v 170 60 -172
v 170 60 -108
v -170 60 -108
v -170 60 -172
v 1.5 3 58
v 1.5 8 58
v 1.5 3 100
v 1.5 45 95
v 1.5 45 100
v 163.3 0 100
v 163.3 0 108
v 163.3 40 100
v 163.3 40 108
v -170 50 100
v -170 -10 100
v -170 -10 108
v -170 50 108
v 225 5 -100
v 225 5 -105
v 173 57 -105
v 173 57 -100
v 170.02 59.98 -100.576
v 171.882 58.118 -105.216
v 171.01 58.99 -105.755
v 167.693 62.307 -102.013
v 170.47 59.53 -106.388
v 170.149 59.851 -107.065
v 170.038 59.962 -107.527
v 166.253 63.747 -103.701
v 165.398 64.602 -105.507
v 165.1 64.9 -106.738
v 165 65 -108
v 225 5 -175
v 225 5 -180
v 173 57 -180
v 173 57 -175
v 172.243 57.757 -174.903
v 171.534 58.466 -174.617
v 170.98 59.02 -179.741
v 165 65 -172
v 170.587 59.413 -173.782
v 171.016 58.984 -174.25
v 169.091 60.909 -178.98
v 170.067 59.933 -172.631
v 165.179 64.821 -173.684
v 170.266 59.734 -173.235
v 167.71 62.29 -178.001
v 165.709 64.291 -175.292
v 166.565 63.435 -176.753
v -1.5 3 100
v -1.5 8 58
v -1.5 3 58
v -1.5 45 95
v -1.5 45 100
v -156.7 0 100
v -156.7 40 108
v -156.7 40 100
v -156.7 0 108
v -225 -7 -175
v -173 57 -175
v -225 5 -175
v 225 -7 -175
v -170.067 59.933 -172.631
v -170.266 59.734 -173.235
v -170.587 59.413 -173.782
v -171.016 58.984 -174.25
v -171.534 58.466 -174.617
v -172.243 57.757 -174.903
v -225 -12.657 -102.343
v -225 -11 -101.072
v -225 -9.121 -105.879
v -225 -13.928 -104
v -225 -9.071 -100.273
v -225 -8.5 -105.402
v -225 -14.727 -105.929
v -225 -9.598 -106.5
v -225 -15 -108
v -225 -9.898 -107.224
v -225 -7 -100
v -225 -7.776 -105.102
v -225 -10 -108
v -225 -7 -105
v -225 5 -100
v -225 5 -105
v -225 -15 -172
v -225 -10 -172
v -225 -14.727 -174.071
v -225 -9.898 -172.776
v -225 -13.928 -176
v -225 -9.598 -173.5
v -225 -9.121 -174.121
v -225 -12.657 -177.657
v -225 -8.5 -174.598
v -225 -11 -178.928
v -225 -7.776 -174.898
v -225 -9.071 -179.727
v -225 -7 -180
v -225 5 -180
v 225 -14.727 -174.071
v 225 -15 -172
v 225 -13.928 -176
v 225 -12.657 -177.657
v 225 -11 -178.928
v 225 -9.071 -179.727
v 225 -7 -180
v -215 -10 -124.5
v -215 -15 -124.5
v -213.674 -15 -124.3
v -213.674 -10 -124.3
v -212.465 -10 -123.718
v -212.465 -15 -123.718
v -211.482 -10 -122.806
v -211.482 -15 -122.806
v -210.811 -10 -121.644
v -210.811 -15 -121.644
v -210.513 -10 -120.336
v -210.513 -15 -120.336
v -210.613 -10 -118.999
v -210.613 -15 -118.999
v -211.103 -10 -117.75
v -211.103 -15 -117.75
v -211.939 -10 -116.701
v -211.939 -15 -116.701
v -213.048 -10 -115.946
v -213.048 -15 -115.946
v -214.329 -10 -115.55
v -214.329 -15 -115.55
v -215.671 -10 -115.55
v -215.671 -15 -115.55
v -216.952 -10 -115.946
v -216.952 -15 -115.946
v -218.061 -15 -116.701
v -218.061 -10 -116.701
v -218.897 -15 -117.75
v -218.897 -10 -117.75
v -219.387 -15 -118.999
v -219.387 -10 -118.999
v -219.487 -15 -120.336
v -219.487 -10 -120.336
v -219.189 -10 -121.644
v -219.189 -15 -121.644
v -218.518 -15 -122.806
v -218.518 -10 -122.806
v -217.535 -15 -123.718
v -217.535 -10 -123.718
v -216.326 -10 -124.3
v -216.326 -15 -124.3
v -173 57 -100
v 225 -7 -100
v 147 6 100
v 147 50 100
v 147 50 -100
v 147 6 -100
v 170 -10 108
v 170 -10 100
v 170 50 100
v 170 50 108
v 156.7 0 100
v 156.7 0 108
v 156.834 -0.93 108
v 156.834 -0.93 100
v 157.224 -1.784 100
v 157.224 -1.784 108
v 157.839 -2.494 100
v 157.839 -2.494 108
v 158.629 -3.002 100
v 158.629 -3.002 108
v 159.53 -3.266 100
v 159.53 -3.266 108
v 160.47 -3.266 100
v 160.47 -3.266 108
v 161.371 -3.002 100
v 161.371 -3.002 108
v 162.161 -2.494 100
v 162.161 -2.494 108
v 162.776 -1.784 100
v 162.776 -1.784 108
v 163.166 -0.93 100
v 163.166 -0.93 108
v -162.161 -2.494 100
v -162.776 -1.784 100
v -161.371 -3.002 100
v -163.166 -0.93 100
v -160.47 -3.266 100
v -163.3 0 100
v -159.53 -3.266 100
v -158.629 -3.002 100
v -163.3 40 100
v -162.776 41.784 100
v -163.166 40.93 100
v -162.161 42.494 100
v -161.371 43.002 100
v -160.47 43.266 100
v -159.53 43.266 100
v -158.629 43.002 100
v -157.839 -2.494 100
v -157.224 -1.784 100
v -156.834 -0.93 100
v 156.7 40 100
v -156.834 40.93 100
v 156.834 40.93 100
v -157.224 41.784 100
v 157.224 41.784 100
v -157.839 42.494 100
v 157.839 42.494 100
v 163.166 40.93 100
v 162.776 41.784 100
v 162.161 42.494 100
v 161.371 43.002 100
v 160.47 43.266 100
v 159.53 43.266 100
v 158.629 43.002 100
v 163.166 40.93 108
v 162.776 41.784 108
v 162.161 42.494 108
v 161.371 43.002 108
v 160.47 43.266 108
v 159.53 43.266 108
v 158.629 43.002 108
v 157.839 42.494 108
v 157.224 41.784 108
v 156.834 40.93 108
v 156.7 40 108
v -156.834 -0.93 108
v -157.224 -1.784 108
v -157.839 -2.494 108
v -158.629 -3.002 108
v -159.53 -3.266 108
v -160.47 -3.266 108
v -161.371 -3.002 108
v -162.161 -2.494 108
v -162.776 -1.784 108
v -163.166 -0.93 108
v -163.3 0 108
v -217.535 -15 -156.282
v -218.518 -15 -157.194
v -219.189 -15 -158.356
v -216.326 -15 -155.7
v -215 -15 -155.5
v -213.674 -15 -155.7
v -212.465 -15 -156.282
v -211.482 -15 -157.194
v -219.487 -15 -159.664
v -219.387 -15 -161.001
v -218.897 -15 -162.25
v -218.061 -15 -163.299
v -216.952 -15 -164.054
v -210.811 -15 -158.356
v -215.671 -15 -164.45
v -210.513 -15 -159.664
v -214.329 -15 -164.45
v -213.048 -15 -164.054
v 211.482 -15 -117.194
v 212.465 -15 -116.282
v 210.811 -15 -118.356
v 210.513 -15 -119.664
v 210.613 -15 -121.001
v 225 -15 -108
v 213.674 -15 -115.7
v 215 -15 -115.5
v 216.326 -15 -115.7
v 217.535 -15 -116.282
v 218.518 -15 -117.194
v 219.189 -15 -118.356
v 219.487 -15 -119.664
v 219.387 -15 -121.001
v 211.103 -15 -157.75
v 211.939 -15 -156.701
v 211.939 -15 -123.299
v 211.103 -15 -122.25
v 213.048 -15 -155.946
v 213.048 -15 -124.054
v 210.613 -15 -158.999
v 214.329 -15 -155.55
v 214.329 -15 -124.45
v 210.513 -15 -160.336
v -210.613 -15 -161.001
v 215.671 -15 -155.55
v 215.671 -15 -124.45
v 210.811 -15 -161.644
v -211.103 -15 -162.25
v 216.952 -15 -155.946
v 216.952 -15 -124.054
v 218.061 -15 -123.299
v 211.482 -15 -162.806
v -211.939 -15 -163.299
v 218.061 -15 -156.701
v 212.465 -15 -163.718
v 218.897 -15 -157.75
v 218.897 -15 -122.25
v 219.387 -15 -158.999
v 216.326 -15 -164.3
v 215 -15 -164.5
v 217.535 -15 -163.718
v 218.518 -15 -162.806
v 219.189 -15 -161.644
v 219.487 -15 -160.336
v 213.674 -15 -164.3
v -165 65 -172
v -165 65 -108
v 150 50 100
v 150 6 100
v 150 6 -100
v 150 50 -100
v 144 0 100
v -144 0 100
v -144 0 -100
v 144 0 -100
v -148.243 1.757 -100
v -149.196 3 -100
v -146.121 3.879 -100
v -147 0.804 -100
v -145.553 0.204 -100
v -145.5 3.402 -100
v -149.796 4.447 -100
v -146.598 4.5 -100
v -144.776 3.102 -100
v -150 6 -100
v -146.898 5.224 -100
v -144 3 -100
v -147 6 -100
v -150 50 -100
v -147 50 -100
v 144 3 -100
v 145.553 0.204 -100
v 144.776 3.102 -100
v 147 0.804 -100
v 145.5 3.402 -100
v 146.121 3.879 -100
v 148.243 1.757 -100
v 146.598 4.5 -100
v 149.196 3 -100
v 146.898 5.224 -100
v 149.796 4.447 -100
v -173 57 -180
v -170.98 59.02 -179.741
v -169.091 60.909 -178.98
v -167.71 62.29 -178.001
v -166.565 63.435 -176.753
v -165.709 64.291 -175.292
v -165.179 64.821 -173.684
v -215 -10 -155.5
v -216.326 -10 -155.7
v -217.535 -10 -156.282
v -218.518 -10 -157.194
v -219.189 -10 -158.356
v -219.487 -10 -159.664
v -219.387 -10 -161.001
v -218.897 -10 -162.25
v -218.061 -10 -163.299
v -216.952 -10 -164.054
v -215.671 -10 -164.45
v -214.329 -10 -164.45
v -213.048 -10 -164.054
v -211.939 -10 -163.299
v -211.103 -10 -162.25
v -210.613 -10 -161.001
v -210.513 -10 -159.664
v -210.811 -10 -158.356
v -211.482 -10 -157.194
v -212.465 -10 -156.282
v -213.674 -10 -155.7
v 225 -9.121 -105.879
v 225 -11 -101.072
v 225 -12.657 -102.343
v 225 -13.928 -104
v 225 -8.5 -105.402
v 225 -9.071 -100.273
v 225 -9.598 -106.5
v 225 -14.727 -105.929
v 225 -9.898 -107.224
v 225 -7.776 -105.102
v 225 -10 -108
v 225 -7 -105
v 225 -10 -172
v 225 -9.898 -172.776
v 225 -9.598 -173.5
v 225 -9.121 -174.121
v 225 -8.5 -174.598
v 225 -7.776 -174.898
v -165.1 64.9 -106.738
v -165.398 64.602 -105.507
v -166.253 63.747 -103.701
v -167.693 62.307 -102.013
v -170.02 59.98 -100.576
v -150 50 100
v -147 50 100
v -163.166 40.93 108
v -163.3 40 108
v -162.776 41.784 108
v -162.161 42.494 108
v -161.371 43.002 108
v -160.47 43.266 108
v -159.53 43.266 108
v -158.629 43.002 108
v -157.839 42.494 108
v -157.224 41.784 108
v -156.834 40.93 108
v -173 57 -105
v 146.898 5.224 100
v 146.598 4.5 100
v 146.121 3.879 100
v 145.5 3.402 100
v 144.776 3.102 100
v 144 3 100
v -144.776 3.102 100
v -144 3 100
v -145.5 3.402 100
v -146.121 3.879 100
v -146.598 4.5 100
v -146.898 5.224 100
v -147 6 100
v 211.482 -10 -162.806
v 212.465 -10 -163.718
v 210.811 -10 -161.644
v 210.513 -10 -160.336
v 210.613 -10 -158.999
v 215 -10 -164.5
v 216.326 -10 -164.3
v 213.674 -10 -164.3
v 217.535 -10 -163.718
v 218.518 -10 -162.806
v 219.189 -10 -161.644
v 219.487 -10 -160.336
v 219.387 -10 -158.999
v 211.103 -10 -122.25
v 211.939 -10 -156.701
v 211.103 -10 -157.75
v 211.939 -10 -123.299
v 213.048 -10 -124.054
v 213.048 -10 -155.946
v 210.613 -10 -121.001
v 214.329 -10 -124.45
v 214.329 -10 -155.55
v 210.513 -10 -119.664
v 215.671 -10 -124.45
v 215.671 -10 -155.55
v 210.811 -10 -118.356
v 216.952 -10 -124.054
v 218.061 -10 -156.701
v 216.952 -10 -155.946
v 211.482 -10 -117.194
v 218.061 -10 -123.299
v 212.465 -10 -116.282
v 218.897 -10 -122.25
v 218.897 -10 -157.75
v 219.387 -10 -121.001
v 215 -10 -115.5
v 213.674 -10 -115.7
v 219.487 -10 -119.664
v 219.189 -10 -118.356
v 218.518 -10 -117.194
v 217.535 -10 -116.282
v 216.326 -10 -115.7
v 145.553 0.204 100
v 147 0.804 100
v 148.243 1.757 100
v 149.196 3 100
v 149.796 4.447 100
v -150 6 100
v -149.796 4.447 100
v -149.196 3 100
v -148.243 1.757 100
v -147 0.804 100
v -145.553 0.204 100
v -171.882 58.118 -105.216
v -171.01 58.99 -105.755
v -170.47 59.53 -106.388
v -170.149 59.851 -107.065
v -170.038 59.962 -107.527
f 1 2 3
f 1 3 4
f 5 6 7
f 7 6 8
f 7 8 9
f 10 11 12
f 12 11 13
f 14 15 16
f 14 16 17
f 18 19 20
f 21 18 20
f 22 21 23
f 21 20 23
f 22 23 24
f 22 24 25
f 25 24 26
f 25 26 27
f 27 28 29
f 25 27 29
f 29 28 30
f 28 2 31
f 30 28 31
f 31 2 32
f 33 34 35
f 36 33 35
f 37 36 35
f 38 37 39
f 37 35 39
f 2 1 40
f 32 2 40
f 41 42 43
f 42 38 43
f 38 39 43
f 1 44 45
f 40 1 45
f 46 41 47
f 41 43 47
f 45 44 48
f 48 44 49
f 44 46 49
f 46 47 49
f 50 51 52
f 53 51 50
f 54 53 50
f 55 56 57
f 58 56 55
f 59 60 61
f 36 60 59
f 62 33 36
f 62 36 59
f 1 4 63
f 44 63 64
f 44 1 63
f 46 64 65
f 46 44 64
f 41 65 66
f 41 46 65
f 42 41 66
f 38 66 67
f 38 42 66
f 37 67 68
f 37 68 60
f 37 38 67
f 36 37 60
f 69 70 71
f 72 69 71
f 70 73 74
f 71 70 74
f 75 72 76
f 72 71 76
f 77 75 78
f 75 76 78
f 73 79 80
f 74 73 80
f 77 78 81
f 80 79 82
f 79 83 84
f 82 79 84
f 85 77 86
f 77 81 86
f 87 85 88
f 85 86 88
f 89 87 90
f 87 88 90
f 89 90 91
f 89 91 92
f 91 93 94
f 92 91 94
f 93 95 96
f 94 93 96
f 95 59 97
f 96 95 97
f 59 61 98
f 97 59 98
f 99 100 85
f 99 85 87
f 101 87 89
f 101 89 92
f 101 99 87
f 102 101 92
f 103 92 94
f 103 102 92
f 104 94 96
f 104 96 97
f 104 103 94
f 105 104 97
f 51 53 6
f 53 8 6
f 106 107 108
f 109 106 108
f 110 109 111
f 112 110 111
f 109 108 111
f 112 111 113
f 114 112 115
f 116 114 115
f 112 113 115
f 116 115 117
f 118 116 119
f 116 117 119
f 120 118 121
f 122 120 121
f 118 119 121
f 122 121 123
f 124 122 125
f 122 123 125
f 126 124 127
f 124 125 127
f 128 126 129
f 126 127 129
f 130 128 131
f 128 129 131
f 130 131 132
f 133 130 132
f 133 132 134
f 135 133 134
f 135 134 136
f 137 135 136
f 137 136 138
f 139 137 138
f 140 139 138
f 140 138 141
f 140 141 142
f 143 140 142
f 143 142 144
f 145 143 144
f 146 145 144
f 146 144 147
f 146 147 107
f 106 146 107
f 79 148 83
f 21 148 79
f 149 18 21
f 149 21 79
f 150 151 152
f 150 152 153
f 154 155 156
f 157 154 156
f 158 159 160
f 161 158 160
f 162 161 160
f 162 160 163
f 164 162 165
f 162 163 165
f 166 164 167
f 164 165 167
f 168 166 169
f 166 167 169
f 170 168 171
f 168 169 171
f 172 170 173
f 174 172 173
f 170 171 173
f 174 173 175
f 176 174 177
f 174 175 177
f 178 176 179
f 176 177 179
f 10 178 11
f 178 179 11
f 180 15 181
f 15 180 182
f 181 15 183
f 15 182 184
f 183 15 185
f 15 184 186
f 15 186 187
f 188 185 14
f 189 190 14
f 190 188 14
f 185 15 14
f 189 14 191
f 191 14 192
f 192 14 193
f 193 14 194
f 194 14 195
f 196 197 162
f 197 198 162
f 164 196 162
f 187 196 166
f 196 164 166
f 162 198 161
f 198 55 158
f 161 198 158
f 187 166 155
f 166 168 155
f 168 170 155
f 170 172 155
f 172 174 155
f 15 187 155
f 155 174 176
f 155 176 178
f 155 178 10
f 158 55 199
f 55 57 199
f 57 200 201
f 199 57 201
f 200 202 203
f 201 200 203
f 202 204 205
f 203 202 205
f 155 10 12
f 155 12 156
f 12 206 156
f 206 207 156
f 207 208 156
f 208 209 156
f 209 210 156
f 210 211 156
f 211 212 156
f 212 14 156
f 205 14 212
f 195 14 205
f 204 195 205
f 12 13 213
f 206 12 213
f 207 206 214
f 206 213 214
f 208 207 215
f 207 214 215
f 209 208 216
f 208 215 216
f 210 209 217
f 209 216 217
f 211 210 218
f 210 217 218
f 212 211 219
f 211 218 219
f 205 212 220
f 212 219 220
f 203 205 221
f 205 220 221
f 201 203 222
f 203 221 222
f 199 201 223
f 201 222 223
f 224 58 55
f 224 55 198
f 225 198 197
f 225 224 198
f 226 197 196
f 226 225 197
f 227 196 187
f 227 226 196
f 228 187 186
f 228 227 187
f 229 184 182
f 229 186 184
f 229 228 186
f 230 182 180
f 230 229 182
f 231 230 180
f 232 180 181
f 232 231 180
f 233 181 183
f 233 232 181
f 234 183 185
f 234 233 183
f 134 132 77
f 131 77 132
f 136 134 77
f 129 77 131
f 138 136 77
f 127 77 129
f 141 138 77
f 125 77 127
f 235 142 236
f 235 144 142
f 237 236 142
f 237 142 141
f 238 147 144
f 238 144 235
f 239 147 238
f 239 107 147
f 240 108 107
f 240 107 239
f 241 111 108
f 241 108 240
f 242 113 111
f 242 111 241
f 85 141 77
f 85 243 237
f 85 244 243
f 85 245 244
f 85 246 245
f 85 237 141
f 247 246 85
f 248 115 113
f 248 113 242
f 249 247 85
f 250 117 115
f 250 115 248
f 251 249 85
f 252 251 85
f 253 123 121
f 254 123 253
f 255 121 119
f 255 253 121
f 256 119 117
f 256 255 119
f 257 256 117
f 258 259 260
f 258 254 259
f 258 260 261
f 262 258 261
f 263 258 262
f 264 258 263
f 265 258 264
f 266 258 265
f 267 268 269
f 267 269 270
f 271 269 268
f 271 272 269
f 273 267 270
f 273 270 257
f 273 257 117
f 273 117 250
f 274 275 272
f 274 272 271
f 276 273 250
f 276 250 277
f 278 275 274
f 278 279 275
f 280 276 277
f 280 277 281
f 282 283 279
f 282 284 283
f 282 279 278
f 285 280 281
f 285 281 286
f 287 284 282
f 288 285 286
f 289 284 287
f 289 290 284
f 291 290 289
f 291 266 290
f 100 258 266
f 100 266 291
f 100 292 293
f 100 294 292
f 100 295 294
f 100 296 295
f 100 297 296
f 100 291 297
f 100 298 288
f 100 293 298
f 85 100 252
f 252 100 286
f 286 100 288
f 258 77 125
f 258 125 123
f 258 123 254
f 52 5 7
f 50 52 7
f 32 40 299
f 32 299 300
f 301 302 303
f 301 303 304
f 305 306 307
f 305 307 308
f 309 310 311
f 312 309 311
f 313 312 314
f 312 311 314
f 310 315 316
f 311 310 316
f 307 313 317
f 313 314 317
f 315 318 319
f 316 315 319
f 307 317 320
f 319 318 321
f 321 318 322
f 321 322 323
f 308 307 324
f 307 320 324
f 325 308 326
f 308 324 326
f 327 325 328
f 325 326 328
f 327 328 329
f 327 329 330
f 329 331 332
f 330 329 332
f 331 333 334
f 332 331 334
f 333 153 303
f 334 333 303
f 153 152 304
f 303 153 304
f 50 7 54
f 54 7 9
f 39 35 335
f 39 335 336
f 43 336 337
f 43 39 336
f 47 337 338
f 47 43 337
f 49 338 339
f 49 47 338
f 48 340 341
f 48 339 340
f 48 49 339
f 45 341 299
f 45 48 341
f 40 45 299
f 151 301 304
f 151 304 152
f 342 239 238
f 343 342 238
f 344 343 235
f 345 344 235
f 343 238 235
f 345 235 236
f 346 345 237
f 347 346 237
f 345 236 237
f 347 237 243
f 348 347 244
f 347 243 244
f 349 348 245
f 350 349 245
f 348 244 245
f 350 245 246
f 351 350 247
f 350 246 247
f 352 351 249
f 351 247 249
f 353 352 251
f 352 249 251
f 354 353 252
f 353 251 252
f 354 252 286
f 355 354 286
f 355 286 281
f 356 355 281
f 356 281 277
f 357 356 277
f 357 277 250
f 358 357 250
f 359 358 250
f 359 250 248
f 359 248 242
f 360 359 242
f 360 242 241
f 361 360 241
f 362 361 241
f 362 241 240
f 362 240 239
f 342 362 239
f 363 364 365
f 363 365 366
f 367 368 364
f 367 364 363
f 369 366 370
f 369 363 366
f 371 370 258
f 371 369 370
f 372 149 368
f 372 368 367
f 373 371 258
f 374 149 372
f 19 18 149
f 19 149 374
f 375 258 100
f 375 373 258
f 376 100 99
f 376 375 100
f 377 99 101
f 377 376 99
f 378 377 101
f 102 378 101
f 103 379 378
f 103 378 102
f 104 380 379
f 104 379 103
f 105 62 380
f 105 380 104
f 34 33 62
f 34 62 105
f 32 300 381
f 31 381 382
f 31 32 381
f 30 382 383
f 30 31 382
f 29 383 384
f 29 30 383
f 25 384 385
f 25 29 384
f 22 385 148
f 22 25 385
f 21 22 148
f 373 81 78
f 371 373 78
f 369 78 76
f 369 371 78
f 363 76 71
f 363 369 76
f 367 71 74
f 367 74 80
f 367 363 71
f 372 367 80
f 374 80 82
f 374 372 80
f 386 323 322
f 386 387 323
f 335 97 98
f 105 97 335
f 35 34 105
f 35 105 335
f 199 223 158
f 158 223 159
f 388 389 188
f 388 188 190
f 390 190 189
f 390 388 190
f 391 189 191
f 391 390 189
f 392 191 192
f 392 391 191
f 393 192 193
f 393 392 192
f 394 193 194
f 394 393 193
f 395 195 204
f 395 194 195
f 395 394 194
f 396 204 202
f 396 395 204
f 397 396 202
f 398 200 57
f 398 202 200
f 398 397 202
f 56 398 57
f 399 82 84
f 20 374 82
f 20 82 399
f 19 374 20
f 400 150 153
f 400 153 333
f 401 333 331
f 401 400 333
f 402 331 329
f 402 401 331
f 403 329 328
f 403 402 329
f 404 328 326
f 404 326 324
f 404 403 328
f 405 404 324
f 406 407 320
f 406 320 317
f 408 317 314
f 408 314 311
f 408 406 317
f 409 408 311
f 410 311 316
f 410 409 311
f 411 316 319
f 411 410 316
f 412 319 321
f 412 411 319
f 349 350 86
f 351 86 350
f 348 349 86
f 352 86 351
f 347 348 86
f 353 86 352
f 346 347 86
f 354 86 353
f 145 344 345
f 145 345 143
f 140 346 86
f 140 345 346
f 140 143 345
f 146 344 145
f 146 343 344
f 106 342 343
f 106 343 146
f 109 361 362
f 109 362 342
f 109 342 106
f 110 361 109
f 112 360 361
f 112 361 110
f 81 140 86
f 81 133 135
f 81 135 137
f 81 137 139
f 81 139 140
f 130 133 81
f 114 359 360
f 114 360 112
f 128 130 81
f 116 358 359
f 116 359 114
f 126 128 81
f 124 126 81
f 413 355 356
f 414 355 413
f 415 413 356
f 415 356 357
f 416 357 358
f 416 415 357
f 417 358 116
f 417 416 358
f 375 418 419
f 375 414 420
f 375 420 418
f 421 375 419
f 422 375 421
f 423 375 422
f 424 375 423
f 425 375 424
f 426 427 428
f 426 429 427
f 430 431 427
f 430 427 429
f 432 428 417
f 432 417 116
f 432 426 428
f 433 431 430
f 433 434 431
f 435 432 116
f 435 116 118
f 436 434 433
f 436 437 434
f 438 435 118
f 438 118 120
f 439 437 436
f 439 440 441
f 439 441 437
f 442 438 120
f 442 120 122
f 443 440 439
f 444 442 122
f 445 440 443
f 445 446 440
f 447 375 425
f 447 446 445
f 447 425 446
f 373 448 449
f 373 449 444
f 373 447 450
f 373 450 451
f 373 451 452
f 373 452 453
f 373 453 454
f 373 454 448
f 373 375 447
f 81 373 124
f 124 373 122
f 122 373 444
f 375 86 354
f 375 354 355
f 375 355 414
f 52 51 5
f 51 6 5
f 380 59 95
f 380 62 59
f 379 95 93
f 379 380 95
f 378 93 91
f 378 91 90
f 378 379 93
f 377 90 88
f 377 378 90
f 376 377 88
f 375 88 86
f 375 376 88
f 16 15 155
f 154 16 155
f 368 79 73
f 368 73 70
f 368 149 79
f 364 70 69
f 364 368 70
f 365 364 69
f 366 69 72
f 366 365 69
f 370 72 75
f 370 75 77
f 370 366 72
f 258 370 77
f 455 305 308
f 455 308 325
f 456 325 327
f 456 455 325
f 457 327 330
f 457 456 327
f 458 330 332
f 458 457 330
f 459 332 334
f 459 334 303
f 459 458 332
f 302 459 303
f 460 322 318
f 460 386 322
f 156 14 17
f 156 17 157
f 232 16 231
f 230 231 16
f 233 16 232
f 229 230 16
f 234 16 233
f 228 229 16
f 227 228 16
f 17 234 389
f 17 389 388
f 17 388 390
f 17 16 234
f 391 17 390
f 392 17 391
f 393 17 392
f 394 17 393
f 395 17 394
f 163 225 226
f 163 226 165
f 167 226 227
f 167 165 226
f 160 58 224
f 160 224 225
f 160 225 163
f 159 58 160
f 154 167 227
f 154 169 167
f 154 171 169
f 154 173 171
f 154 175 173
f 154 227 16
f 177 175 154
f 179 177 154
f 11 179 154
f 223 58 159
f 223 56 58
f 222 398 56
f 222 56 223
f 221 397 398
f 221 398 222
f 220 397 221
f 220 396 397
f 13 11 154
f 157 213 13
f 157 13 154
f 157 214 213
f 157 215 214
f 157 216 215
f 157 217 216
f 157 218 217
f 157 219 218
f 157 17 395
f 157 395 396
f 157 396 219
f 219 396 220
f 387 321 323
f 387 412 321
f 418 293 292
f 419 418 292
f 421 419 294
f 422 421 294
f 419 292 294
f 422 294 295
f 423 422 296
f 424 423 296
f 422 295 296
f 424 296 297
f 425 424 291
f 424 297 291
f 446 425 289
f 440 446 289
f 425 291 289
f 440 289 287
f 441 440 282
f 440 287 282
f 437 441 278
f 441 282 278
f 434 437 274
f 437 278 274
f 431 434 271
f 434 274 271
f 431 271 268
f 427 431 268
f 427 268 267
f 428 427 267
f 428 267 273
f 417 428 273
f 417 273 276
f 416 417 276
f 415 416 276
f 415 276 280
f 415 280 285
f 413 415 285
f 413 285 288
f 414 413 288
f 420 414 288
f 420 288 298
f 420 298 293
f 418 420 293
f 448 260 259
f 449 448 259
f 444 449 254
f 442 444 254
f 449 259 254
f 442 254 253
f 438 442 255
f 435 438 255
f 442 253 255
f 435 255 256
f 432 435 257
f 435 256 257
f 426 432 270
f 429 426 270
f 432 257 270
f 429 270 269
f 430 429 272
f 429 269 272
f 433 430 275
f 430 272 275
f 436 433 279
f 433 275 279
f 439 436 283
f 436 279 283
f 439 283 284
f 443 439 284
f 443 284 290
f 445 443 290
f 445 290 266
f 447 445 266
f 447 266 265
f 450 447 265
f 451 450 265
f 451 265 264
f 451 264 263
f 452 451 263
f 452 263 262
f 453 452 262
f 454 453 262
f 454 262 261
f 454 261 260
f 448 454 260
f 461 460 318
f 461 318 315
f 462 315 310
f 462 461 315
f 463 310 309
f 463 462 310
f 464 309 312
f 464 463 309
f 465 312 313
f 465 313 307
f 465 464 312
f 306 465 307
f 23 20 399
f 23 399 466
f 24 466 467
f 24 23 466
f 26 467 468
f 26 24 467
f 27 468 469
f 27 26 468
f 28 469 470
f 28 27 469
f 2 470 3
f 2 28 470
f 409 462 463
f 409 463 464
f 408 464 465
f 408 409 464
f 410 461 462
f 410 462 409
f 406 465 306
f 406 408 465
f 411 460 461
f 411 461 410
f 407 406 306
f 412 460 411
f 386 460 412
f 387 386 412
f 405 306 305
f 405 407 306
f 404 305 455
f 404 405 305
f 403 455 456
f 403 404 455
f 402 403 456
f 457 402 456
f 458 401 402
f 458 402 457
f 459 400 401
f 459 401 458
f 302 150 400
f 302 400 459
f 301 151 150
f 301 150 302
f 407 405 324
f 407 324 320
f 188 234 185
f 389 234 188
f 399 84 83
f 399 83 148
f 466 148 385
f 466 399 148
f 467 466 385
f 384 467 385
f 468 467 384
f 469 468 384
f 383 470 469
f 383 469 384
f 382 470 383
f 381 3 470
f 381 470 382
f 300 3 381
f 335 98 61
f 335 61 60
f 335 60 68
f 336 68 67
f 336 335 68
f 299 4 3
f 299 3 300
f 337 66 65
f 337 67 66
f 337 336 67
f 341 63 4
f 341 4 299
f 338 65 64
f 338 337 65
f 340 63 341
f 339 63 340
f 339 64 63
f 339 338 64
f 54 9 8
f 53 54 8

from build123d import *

# Parameters (mm, degrees)
AUFSATZ_LINEAR_AUSTRAGEN1_DEPTH = 100
SKIZZE2_W                       = 340
SKIZZE2_H                       = 60
AUFSATZ_LINEAR_AUSTRAGEN2_DEPTH = 8
AUFSATZ_LINEAR_AUSTRAGEN3_DEPTH = 1.5
SCHNITT_LINEAR_AUSTRAGEN1_DEPTH = 209
AUFSATZ_LINEAR_AUSTRAGEN4_DEPTH = 225
SCHNITT_LINEAR_AUSTRAGEN2_DEPTH = 289
SKIZZE8_R                       = 4.5
SCHNITT_LINEAR_AUSTRAGEN3_DEPTH = 81


with BuildPart() as part:
    # Skizze1 → Aufsatz-Linear austragen1 (new body, symmetric)
    with BuildSketch(Plane.XY):
        with BuildLine():
            Line((-150, 50), (-150, 6))
            ThreePointArc((-150, 6), (-148.242640687, 1.757359313), (-144, 0))
            Line((-144, 0), (144, 0))
            ThreePointArc((144, 0), (148.242640687, 1.757359313), (150, 6))
            Line((150, 6), (150, 50))
            Line((150, 50), (147, 50))
            Line((147, 50), (147, 6))
            ThreePointArc((147, 6), (146.121320344, 3.878679656), (144, 3))
            Line((144, 3), (-144, 3))
            ThreePointArc((-144, 3), (-146.121320344, 3.878679656), (-147, 6))
            Line((-147, 6), (-147, 50))
            Line((-147, 50), (-150, 50))
        make_face()
    extrude(amount=AUFSATZ_LINEAR_AUSTRAGEN1_DEPTH, both=True)


with BuildPart() as body_2:
    # Skizze2 → Aufsatz-Linear austragen2 (new body)
    with BuildSketch(Plane.XY.offset(100)):
        with Locations((0, 20)):
            Rectangle(SKIZZE2_W, SKIZZE2_H)
    extrude(amount=AUFSATZ_LINEAR_AUSTRAGEN2_DEPTH)

    # Skizze5 → Schnitt-Linear austragen1 (cut, through all)
    with BuildSketch(Plane.XY.offset(108)):
        with BuildLine():
            Line((163.3, 0), (163.3, 40))
            ThreePointArc((163.3, 40), (160, 43.3), (156.7, 40))
            Line((156.7, 40), (156.7, 0))
            ThreePointArc((156.7, 0), (160, -3.3), (163.3, 0))
        make_face()
    schnitt_linear_austragen1 = extrude(amount=-SCHNITT_LINEAR_AUSTRAGEN1_DEPTH, mode=Mode.SUBTRACT)

    # Spiegeln1: Schnitt-Linear austragen1 across plane
    add(schnitt_linear_austragen1.mirror(Plane(origin=(0, 0, 0), x_dir=(0, 0, 1), z_dir=(1, 0, 0))), mode=Mode.SUBTRACT)


with BuildPart() as body_3:
    # Skizze4 → Aufsatz-Linear austragen3 (new body, symmetric)
    with BuildSketch(Plane(origin=(0, 0, 0), x_dir=(0, 0, -1), z_dir=(1, 0, 0))):
        Polygon((-100, 45), (-95, 45), (-58, 8), (-58, 3), (-100, 3), align=None)
    extrude(amount=AUFSATZ_LINEAR_AUSTRAGEN3_DEPTH, both=True)


with BuildPart() as body_4:
    # Skizze6 → Aufsatz-Linear austragen4 (new body, symmetric)
    with BuildSketch(Plane(origin=(0, 0, 0), x_dir=(0, 0, -1), z_dir=(1, 0, 0))):
        with BuildLine():
            Line((108, -15), (172, -15))
            ThreePointArc((172, -15), (177.656854249, -12.656854249), (180, -7))
            Line((180, -7), (180, 57))
            ThreePointArc((180, 57), (177.656854249, 62.656854249), (172, 65))
            Line((172, 65), (108, 65))
            ThreePointArc((108, 65), (102.343145751, 62.656854249), (100, 57))
            Line((100, 57), (100, -7))
            ThreePointArc((100, -7), (102.343145751, -12.656854249), (108, -15))
        make_face()
        with BuildLine():
            Line((108, 60), (172, 60))
            ThreePointArc((172, 60), (174.121320344, 59.121320344), (175, 57))
            Line((175, 57), (175, -7))
            ThreePointArc((175, -7), (174.121320344, -9.121320344), (172, -10))
            Line((172, -10), (108, -10))
            ThreePointArc((108, -10), (105.878679656, -9.121320344), (105, -7))
            Line((105, -7), (105, 57))
            ThreePointArc((105, 57), (105.878679656, 59.121320344), (108, 60))
        make_face(mode=Mode.SUBTRACT)
    extrude(amount=AUFSATZ_LINEAR_AUSTRAGEN4_DEPTH, both=True)

    # Skizze7 → Schnitt-Linear austragen2 (cut, through all)
    with BuildSketch(Plane(origin=(0, 0, -180), x_dir=(-1, 0, 0), z_dir=(0, 0, -1))):
        Polygon((-225, 5), (-165, 65), (-225, 65), align=None)
        Polygon((225, 65), (225, 5), (165, 65), align=None)
    extrude(amount=-SCHNITT_LINEAR_AUSTRAGEN2_DEPTH, mode=Mode.SUBTRACT)

    # Skizze8 → Schnitt-Linear austragen3 (cut, through all)
    with BuildSketch(Plane.XZ.offset(15)):
        with Locations(Location((215, -160, 0), (0, 0, 270))):  # turned: the seam where the file's is
            Circle(SKIZZE8_R)
        with Locations(Location((215, -120, 0), (0, 0, 90))):  # turned: the seam where the file's is
            Circle(SKIZZE8_R)
        with Locations(Location((-215, -160, 0), (0, 0, 90))):  # turned: the seam where the file's is
            Circle(SKIZZE8_R)
        with Locations(Location((-215, -120, 0), (0, 0, 270))):  # turned: the seam where the file's is
            Circle(SKIZZE8_R)
    extrude(amount=-SCHNITT_LINEAR_AUSTRAGEN3_DEPTH, mode=Mode.SUBTRACT)


solid = Compound([part.part, body_2.part, body_3.part, body_4.part])
